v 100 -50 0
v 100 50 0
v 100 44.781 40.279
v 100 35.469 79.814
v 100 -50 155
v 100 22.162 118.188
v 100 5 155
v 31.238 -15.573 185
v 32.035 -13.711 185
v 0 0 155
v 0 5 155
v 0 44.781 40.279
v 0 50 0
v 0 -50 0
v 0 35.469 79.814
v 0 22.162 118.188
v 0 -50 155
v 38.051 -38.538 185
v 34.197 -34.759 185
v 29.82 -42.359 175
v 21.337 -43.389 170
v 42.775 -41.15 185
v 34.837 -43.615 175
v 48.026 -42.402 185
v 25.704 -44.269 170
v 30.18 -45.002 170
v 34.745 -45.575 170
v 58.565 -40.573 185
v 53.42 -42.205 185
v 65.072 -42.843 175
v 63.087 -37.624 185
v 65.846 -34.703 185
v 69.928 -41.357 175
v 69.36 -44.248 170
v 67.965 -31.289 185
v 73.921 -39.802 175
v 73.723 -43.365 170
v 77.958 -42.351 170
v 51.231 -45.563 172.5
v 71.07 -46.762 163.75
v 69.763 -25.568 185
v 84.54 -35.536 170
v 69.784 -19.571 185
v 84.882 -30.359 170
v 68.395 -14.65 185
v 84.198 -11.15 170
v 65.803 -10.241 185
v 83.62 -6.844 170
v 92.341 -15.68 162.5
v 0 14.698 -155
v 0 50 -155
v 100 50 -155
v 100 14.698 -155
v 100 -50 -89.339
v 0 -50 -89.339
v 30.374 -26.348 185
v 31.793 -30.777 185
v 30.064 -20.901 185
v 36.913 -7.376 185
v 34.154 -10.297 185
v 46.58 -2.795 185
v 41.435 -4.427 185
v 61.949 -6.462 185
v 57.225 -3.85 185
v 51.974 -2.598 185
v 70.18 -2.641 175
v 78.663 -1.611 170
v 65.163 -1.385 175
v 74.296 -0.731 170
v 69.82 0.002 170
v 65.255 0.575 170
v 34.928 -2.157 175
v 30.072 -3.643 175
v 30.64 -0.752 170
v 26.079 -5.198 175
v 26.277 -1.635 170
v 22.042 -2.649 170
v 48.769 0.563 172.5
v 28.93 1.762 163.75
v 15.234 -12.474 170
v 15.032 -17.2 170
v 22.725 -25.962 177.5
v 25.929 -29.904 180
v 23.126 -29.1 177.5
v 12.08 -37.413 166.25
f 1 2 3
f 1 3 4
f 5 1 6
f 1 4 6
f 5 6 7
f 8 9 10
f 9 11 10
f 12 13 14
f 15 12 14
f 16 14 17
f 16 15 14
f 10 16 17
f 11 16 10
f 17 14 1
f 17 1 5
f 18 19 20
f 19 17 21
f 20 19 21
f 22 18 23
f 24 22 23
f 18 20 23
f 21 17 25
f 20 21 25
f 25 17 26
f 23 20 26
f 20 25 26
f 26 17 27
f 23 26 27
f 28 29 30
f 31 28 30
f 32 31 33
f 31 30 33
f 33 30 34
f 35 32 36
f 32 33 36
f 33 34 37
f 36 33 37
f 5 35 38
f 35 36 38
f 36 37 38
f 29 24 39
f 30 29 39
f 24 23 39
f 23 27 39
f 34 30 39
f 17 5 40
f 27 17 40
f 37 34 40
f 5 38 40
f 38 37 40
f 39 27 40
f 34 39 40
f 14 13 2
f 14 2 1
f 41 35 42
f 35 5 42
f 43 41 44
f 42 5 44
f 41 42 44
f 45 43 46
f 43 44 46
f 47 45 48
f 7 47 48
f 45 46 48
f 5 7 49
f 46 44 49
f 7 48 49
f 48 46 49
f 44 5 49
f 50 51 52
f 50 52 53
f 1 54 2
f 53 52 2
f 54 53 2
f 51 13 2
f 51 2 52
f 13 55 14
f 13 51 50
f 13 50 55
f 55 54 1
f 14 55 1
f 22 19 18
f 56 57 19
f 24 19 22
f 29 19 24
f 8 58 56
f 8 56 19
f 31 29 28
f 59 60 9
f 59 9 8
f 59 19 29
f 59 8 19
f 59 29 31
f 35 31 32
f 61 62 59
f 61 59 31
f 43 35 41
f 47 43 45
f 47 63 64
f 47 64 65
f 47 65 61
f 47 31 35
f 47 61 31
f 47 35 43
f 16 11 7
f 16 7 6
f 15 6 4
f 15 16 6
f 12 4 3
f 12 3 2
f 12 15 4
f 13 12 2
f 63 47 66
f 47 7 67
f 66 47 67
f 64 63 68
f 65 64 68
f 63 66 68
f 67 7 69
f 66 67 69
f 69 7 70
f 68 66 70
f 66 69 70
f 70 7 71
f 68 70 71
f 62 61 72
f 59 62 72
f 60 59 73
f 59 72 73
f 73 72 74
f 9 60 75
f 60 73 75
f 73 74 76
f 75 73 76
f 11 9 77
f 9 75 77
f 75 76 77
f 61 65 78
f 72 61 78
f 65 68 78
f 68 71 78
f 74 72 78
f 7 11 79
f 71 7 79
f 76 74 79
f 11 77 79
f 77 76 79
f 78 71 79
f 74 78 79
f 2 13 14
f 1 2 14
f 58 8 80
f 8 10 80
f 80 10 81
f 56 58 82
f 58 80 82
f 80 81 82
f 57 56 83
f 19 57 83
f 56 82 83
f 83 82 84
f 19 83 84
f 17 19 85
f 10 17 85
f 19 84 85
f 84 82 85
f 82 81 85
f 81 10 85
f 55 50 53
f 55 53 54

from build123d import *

# Parameters (mm, degrees)
BOSS_EXTRUDE1_DEPTH    = 100
SPLIT1_SURFACE_1_BACK  = 369.239
SPLIT1_SURFACE_1_DEPTH = 738.478
SPLIT1_SURFACE_2_BACK  = 369.239
SPLIT1_SURFACE_2_DEPTH = 738.478


with BuildPart() as part:
    # Sketch3 → Boss-Extrude1 (new body)
    with BuildSketch(Plane(origin=(0, 0, 0), x_dir=(0, 0, -1), z_dir=(1, 0, 0))):
        with BuildLine():
            Line((-155, -50), (-155, 5))
            ThreePointArc((-155, 5), (-79.813539645, 35.468858776), (0, 50))
            Line((0, 50), (155, 50))
            Line((155, 50), (155, 14.698133415))
            Line((155, 14.698133415), (89.339083264, -50))
            Line((89.339083264, -50), (-155, -50))
        make_face()
    extrude(amount=BOSS_EXTRUDE1_DEPTH)

    # Boundary1: read off the stored shape, not the designer's step
    # Boundary1: loft between two sections, ruled curve by curve
    boundary1_from = [
        Edge.make_bspline([(31.237757156, -15.573367091, 185), (30.652793203, -17.157865056, 185), (29.886284502, -20.475700825, 185), (30.021147921, -25.581876421, 185), (31.431265533, -30.491335219, 185), (33.16195132, -33.423961428, 185), (34.197201541, -34.758530126, 185)], [0, 0, 0, 0, 0.25, 0.5, 0.75, 1, 1, 1, 1], 3),
        Edge.make_bspline([(34.197201541, -34.758530126, 185), (35.232451761, -36.093098823, 185), (37.642644081, -38.498582399, 185), (42.047325798, -41.085172558, 185), (46.959588117, -42.485308309, 185), (52.06601026, -42.609319976, 185), (57.040543341, -41.449601635, 185), (61.565496183, -39.079896381, 185), (65.352228079, -35.651729054, 185), (67.222960323, -32.806427817, 185), (67.965224015, -31.289239221, 185)], [0, 0, 0, 0, 0.125, 0.25, 0.375, 0.5, 0.625, 0.75, 0.875, 1, 1, 1, 1], 3),
        Edge.make_bspline([(67.965224015, -31.289239221, 185), (68.781714077, -29.620331765, 185), (69.946725169, -26.053708986, 185), (70.154611053, -20.429336582, 185), (68.807454947, -14.964727548, 185), (66.941573702, -11.709495441, 185), (65.802798459, -10.241469874, 185)], [0, 0, 0, 0, 0.25, 0.5, 0.75, 1, 1, 1, 1], 3),
        Edge.make_bspline([(65.802798459, -10.241469874, 185), (64.767548239, -8.906901177, 185), (62.357355919, -6.501417601, 185), (57.952674202, -3.914827442, 185), (53.040411883, -2.514691691, 185), (47.93398974, -2.390680024, 185), (42.959456659, -3.550398365, 185), (38.434503817, -5.920103619, 185), (34.647771921, -9.348270946, 185), (32.777039677, -12.193572183, 185), (32.034775985, -13.710760779, 185)], [0, 0, 0, 0, 0.125, 0.25, 0.375, 0.5, 0.625, 0.75, 0.875, 1, 1, 1, 1], 3),
        Edge.make_bspline([(32.034775985, -13.710760779, 185), (31.960549615, -13.862479639, 185), (31.815940975, -14.167797893, 185), (31.610699362, -14.631123595, 185), (31.417260882, -15.099499919, 185), (31.296253551, -15.414917295, 185), (31.237757156, -15.573367091, 185)], [0, 0, 0, 0, 0.25, 0.5, 0.75, 1, 1, 1, 1], 3),
    ]
    boundary1_to = [
        Edge.make_bspline([(0, 0, 155), (0, -4.166666667, 155), (0, -12.5, 155), (0, -25, 155), (0, -37.5, 155), (0, -45.833333333, 155), (0, -50, 155)], [0, 0, 0, 0, 0.25, 0.5, 0.75, 1, 1, 1, 1], 3),
        Edge.make_bspline([(0, -50, 155), (4.166666667, -50, 155), (12.5, -50, 155), (25, -50, 155), (37.5, -50, 155), (50, -50, 155), (62.5, -50, 155), (75, -50, 155), (87.5, -50, 155), (95.833333333, -50, 155), (100, -50, 155)], [0, 0, 0, 0, 0.125, 0.25, 0.375, 0.5, 0.625, 0.75, 0.875, 1, 1, 1, 1], 3),
        Edge.make_bspline([(100, -50, 155), (100, -45.416666667, 155), (100, -36.25, 155), (100, -22.5, 155), (100, -8.75, 155), (100, 0.416666667, 155), (100, 5, 155)], [0, 0, 0, 0, 0.25, 0.5, 0.75, 1, 1, 1, 1], 3),
        Edge.make_bspline([(100, 5, 155), (95.833333333, 5, 155), (87.5, 5, 155), (75, 5, 155), (62.5, 5, 155), (50, 5, 155), (37.5, 5, 155), (25, 5, 155), (12.5, 5, 155), (4.166666667, 5, 155), (0, 5, 155)], [0, 0, 0, 0, 0.125, 0.25, 0.375, 0.5, 0.625, 0.75, 0.875, 1, 1, 1, 1], 3),
        Edge.make_bspline([(0, 5, 155), (0, 4.583333333, 155), (0, 3.75, 155), (0, 2.5, 155), (0, 1.25, 155), (0, 0.416666667, 155), (0, 0, 155)], [0, 0, 0, 0, 0.25, 0.5, 0.75, 1, 1, 1, 1], 3),
    ]
    boundary1 = Solid(Shell([*[Face.make_surface_from_curves(boundary1_from[k], boundary1_to[k]) for k in range(5)], Face(Wire(boundary1_from)), Face(Wire(boundary1_to))]))
    add(boundary1)


with BuildPart() as body_2:
    # Split1: the piece behind the surface
    add(part.part)
    # Split1 surface: a surface, the sketch's curves swept straight by 738.478 mm
    with BuildLine(Plane(origin=(100, 0, 0), x_dir=(0, 0, -1), z_dir=(1, 0, 0)).offset(-SPLIT1_SURFACE_1_BACK), mode=Mode.PRIVATE) as split1_surface_1_path:
        Line((0, 50), (0, -50))
    split1_surface_1 = Shell.extrude(split1_surface_1_path.wire(), (1 * SPLIT1_SURFACE_1_DEPTH, 0 * SPLIT1_SURFACE_1_DEPTH, 0 * SPLIT1_SURFACE_1_DEPTH))
    split(bisect_by=split1_surface_1, keep=Keep.BOTTOM)


with BuildPart() as part_1:
    add(part.part)

    # Split1: split by a surface, the side it looks to stays
    # Split1 surface: a surface, the sketch's curves swept straight by 738.478 mm
    with BuildLine(Plane(origin=(100, 0, 0), x_dir=(0, 0, -1), z_dir=(1, 0, 0)).offset(-SPLIT1_SURFACE_2_BACK), mode=Mode.PRIVATE) as split1_surface_2_path:
        Line((0, 50), (0, -50))
    split1_surface_2 = Shell.extrude(split1_surface_2_path.wire(), (1 * SPLIT1_SURFACE_2_DEPTH, 0 * SPLIT1_SURFACE_2_DEPTH, 0 * SPLIT1_SURFACE_2_DEPTH))
    split(bisect_by=split1_surface_2, keep=Keep.TOP)


solid = Compound([body_2.part, part_1.part])
